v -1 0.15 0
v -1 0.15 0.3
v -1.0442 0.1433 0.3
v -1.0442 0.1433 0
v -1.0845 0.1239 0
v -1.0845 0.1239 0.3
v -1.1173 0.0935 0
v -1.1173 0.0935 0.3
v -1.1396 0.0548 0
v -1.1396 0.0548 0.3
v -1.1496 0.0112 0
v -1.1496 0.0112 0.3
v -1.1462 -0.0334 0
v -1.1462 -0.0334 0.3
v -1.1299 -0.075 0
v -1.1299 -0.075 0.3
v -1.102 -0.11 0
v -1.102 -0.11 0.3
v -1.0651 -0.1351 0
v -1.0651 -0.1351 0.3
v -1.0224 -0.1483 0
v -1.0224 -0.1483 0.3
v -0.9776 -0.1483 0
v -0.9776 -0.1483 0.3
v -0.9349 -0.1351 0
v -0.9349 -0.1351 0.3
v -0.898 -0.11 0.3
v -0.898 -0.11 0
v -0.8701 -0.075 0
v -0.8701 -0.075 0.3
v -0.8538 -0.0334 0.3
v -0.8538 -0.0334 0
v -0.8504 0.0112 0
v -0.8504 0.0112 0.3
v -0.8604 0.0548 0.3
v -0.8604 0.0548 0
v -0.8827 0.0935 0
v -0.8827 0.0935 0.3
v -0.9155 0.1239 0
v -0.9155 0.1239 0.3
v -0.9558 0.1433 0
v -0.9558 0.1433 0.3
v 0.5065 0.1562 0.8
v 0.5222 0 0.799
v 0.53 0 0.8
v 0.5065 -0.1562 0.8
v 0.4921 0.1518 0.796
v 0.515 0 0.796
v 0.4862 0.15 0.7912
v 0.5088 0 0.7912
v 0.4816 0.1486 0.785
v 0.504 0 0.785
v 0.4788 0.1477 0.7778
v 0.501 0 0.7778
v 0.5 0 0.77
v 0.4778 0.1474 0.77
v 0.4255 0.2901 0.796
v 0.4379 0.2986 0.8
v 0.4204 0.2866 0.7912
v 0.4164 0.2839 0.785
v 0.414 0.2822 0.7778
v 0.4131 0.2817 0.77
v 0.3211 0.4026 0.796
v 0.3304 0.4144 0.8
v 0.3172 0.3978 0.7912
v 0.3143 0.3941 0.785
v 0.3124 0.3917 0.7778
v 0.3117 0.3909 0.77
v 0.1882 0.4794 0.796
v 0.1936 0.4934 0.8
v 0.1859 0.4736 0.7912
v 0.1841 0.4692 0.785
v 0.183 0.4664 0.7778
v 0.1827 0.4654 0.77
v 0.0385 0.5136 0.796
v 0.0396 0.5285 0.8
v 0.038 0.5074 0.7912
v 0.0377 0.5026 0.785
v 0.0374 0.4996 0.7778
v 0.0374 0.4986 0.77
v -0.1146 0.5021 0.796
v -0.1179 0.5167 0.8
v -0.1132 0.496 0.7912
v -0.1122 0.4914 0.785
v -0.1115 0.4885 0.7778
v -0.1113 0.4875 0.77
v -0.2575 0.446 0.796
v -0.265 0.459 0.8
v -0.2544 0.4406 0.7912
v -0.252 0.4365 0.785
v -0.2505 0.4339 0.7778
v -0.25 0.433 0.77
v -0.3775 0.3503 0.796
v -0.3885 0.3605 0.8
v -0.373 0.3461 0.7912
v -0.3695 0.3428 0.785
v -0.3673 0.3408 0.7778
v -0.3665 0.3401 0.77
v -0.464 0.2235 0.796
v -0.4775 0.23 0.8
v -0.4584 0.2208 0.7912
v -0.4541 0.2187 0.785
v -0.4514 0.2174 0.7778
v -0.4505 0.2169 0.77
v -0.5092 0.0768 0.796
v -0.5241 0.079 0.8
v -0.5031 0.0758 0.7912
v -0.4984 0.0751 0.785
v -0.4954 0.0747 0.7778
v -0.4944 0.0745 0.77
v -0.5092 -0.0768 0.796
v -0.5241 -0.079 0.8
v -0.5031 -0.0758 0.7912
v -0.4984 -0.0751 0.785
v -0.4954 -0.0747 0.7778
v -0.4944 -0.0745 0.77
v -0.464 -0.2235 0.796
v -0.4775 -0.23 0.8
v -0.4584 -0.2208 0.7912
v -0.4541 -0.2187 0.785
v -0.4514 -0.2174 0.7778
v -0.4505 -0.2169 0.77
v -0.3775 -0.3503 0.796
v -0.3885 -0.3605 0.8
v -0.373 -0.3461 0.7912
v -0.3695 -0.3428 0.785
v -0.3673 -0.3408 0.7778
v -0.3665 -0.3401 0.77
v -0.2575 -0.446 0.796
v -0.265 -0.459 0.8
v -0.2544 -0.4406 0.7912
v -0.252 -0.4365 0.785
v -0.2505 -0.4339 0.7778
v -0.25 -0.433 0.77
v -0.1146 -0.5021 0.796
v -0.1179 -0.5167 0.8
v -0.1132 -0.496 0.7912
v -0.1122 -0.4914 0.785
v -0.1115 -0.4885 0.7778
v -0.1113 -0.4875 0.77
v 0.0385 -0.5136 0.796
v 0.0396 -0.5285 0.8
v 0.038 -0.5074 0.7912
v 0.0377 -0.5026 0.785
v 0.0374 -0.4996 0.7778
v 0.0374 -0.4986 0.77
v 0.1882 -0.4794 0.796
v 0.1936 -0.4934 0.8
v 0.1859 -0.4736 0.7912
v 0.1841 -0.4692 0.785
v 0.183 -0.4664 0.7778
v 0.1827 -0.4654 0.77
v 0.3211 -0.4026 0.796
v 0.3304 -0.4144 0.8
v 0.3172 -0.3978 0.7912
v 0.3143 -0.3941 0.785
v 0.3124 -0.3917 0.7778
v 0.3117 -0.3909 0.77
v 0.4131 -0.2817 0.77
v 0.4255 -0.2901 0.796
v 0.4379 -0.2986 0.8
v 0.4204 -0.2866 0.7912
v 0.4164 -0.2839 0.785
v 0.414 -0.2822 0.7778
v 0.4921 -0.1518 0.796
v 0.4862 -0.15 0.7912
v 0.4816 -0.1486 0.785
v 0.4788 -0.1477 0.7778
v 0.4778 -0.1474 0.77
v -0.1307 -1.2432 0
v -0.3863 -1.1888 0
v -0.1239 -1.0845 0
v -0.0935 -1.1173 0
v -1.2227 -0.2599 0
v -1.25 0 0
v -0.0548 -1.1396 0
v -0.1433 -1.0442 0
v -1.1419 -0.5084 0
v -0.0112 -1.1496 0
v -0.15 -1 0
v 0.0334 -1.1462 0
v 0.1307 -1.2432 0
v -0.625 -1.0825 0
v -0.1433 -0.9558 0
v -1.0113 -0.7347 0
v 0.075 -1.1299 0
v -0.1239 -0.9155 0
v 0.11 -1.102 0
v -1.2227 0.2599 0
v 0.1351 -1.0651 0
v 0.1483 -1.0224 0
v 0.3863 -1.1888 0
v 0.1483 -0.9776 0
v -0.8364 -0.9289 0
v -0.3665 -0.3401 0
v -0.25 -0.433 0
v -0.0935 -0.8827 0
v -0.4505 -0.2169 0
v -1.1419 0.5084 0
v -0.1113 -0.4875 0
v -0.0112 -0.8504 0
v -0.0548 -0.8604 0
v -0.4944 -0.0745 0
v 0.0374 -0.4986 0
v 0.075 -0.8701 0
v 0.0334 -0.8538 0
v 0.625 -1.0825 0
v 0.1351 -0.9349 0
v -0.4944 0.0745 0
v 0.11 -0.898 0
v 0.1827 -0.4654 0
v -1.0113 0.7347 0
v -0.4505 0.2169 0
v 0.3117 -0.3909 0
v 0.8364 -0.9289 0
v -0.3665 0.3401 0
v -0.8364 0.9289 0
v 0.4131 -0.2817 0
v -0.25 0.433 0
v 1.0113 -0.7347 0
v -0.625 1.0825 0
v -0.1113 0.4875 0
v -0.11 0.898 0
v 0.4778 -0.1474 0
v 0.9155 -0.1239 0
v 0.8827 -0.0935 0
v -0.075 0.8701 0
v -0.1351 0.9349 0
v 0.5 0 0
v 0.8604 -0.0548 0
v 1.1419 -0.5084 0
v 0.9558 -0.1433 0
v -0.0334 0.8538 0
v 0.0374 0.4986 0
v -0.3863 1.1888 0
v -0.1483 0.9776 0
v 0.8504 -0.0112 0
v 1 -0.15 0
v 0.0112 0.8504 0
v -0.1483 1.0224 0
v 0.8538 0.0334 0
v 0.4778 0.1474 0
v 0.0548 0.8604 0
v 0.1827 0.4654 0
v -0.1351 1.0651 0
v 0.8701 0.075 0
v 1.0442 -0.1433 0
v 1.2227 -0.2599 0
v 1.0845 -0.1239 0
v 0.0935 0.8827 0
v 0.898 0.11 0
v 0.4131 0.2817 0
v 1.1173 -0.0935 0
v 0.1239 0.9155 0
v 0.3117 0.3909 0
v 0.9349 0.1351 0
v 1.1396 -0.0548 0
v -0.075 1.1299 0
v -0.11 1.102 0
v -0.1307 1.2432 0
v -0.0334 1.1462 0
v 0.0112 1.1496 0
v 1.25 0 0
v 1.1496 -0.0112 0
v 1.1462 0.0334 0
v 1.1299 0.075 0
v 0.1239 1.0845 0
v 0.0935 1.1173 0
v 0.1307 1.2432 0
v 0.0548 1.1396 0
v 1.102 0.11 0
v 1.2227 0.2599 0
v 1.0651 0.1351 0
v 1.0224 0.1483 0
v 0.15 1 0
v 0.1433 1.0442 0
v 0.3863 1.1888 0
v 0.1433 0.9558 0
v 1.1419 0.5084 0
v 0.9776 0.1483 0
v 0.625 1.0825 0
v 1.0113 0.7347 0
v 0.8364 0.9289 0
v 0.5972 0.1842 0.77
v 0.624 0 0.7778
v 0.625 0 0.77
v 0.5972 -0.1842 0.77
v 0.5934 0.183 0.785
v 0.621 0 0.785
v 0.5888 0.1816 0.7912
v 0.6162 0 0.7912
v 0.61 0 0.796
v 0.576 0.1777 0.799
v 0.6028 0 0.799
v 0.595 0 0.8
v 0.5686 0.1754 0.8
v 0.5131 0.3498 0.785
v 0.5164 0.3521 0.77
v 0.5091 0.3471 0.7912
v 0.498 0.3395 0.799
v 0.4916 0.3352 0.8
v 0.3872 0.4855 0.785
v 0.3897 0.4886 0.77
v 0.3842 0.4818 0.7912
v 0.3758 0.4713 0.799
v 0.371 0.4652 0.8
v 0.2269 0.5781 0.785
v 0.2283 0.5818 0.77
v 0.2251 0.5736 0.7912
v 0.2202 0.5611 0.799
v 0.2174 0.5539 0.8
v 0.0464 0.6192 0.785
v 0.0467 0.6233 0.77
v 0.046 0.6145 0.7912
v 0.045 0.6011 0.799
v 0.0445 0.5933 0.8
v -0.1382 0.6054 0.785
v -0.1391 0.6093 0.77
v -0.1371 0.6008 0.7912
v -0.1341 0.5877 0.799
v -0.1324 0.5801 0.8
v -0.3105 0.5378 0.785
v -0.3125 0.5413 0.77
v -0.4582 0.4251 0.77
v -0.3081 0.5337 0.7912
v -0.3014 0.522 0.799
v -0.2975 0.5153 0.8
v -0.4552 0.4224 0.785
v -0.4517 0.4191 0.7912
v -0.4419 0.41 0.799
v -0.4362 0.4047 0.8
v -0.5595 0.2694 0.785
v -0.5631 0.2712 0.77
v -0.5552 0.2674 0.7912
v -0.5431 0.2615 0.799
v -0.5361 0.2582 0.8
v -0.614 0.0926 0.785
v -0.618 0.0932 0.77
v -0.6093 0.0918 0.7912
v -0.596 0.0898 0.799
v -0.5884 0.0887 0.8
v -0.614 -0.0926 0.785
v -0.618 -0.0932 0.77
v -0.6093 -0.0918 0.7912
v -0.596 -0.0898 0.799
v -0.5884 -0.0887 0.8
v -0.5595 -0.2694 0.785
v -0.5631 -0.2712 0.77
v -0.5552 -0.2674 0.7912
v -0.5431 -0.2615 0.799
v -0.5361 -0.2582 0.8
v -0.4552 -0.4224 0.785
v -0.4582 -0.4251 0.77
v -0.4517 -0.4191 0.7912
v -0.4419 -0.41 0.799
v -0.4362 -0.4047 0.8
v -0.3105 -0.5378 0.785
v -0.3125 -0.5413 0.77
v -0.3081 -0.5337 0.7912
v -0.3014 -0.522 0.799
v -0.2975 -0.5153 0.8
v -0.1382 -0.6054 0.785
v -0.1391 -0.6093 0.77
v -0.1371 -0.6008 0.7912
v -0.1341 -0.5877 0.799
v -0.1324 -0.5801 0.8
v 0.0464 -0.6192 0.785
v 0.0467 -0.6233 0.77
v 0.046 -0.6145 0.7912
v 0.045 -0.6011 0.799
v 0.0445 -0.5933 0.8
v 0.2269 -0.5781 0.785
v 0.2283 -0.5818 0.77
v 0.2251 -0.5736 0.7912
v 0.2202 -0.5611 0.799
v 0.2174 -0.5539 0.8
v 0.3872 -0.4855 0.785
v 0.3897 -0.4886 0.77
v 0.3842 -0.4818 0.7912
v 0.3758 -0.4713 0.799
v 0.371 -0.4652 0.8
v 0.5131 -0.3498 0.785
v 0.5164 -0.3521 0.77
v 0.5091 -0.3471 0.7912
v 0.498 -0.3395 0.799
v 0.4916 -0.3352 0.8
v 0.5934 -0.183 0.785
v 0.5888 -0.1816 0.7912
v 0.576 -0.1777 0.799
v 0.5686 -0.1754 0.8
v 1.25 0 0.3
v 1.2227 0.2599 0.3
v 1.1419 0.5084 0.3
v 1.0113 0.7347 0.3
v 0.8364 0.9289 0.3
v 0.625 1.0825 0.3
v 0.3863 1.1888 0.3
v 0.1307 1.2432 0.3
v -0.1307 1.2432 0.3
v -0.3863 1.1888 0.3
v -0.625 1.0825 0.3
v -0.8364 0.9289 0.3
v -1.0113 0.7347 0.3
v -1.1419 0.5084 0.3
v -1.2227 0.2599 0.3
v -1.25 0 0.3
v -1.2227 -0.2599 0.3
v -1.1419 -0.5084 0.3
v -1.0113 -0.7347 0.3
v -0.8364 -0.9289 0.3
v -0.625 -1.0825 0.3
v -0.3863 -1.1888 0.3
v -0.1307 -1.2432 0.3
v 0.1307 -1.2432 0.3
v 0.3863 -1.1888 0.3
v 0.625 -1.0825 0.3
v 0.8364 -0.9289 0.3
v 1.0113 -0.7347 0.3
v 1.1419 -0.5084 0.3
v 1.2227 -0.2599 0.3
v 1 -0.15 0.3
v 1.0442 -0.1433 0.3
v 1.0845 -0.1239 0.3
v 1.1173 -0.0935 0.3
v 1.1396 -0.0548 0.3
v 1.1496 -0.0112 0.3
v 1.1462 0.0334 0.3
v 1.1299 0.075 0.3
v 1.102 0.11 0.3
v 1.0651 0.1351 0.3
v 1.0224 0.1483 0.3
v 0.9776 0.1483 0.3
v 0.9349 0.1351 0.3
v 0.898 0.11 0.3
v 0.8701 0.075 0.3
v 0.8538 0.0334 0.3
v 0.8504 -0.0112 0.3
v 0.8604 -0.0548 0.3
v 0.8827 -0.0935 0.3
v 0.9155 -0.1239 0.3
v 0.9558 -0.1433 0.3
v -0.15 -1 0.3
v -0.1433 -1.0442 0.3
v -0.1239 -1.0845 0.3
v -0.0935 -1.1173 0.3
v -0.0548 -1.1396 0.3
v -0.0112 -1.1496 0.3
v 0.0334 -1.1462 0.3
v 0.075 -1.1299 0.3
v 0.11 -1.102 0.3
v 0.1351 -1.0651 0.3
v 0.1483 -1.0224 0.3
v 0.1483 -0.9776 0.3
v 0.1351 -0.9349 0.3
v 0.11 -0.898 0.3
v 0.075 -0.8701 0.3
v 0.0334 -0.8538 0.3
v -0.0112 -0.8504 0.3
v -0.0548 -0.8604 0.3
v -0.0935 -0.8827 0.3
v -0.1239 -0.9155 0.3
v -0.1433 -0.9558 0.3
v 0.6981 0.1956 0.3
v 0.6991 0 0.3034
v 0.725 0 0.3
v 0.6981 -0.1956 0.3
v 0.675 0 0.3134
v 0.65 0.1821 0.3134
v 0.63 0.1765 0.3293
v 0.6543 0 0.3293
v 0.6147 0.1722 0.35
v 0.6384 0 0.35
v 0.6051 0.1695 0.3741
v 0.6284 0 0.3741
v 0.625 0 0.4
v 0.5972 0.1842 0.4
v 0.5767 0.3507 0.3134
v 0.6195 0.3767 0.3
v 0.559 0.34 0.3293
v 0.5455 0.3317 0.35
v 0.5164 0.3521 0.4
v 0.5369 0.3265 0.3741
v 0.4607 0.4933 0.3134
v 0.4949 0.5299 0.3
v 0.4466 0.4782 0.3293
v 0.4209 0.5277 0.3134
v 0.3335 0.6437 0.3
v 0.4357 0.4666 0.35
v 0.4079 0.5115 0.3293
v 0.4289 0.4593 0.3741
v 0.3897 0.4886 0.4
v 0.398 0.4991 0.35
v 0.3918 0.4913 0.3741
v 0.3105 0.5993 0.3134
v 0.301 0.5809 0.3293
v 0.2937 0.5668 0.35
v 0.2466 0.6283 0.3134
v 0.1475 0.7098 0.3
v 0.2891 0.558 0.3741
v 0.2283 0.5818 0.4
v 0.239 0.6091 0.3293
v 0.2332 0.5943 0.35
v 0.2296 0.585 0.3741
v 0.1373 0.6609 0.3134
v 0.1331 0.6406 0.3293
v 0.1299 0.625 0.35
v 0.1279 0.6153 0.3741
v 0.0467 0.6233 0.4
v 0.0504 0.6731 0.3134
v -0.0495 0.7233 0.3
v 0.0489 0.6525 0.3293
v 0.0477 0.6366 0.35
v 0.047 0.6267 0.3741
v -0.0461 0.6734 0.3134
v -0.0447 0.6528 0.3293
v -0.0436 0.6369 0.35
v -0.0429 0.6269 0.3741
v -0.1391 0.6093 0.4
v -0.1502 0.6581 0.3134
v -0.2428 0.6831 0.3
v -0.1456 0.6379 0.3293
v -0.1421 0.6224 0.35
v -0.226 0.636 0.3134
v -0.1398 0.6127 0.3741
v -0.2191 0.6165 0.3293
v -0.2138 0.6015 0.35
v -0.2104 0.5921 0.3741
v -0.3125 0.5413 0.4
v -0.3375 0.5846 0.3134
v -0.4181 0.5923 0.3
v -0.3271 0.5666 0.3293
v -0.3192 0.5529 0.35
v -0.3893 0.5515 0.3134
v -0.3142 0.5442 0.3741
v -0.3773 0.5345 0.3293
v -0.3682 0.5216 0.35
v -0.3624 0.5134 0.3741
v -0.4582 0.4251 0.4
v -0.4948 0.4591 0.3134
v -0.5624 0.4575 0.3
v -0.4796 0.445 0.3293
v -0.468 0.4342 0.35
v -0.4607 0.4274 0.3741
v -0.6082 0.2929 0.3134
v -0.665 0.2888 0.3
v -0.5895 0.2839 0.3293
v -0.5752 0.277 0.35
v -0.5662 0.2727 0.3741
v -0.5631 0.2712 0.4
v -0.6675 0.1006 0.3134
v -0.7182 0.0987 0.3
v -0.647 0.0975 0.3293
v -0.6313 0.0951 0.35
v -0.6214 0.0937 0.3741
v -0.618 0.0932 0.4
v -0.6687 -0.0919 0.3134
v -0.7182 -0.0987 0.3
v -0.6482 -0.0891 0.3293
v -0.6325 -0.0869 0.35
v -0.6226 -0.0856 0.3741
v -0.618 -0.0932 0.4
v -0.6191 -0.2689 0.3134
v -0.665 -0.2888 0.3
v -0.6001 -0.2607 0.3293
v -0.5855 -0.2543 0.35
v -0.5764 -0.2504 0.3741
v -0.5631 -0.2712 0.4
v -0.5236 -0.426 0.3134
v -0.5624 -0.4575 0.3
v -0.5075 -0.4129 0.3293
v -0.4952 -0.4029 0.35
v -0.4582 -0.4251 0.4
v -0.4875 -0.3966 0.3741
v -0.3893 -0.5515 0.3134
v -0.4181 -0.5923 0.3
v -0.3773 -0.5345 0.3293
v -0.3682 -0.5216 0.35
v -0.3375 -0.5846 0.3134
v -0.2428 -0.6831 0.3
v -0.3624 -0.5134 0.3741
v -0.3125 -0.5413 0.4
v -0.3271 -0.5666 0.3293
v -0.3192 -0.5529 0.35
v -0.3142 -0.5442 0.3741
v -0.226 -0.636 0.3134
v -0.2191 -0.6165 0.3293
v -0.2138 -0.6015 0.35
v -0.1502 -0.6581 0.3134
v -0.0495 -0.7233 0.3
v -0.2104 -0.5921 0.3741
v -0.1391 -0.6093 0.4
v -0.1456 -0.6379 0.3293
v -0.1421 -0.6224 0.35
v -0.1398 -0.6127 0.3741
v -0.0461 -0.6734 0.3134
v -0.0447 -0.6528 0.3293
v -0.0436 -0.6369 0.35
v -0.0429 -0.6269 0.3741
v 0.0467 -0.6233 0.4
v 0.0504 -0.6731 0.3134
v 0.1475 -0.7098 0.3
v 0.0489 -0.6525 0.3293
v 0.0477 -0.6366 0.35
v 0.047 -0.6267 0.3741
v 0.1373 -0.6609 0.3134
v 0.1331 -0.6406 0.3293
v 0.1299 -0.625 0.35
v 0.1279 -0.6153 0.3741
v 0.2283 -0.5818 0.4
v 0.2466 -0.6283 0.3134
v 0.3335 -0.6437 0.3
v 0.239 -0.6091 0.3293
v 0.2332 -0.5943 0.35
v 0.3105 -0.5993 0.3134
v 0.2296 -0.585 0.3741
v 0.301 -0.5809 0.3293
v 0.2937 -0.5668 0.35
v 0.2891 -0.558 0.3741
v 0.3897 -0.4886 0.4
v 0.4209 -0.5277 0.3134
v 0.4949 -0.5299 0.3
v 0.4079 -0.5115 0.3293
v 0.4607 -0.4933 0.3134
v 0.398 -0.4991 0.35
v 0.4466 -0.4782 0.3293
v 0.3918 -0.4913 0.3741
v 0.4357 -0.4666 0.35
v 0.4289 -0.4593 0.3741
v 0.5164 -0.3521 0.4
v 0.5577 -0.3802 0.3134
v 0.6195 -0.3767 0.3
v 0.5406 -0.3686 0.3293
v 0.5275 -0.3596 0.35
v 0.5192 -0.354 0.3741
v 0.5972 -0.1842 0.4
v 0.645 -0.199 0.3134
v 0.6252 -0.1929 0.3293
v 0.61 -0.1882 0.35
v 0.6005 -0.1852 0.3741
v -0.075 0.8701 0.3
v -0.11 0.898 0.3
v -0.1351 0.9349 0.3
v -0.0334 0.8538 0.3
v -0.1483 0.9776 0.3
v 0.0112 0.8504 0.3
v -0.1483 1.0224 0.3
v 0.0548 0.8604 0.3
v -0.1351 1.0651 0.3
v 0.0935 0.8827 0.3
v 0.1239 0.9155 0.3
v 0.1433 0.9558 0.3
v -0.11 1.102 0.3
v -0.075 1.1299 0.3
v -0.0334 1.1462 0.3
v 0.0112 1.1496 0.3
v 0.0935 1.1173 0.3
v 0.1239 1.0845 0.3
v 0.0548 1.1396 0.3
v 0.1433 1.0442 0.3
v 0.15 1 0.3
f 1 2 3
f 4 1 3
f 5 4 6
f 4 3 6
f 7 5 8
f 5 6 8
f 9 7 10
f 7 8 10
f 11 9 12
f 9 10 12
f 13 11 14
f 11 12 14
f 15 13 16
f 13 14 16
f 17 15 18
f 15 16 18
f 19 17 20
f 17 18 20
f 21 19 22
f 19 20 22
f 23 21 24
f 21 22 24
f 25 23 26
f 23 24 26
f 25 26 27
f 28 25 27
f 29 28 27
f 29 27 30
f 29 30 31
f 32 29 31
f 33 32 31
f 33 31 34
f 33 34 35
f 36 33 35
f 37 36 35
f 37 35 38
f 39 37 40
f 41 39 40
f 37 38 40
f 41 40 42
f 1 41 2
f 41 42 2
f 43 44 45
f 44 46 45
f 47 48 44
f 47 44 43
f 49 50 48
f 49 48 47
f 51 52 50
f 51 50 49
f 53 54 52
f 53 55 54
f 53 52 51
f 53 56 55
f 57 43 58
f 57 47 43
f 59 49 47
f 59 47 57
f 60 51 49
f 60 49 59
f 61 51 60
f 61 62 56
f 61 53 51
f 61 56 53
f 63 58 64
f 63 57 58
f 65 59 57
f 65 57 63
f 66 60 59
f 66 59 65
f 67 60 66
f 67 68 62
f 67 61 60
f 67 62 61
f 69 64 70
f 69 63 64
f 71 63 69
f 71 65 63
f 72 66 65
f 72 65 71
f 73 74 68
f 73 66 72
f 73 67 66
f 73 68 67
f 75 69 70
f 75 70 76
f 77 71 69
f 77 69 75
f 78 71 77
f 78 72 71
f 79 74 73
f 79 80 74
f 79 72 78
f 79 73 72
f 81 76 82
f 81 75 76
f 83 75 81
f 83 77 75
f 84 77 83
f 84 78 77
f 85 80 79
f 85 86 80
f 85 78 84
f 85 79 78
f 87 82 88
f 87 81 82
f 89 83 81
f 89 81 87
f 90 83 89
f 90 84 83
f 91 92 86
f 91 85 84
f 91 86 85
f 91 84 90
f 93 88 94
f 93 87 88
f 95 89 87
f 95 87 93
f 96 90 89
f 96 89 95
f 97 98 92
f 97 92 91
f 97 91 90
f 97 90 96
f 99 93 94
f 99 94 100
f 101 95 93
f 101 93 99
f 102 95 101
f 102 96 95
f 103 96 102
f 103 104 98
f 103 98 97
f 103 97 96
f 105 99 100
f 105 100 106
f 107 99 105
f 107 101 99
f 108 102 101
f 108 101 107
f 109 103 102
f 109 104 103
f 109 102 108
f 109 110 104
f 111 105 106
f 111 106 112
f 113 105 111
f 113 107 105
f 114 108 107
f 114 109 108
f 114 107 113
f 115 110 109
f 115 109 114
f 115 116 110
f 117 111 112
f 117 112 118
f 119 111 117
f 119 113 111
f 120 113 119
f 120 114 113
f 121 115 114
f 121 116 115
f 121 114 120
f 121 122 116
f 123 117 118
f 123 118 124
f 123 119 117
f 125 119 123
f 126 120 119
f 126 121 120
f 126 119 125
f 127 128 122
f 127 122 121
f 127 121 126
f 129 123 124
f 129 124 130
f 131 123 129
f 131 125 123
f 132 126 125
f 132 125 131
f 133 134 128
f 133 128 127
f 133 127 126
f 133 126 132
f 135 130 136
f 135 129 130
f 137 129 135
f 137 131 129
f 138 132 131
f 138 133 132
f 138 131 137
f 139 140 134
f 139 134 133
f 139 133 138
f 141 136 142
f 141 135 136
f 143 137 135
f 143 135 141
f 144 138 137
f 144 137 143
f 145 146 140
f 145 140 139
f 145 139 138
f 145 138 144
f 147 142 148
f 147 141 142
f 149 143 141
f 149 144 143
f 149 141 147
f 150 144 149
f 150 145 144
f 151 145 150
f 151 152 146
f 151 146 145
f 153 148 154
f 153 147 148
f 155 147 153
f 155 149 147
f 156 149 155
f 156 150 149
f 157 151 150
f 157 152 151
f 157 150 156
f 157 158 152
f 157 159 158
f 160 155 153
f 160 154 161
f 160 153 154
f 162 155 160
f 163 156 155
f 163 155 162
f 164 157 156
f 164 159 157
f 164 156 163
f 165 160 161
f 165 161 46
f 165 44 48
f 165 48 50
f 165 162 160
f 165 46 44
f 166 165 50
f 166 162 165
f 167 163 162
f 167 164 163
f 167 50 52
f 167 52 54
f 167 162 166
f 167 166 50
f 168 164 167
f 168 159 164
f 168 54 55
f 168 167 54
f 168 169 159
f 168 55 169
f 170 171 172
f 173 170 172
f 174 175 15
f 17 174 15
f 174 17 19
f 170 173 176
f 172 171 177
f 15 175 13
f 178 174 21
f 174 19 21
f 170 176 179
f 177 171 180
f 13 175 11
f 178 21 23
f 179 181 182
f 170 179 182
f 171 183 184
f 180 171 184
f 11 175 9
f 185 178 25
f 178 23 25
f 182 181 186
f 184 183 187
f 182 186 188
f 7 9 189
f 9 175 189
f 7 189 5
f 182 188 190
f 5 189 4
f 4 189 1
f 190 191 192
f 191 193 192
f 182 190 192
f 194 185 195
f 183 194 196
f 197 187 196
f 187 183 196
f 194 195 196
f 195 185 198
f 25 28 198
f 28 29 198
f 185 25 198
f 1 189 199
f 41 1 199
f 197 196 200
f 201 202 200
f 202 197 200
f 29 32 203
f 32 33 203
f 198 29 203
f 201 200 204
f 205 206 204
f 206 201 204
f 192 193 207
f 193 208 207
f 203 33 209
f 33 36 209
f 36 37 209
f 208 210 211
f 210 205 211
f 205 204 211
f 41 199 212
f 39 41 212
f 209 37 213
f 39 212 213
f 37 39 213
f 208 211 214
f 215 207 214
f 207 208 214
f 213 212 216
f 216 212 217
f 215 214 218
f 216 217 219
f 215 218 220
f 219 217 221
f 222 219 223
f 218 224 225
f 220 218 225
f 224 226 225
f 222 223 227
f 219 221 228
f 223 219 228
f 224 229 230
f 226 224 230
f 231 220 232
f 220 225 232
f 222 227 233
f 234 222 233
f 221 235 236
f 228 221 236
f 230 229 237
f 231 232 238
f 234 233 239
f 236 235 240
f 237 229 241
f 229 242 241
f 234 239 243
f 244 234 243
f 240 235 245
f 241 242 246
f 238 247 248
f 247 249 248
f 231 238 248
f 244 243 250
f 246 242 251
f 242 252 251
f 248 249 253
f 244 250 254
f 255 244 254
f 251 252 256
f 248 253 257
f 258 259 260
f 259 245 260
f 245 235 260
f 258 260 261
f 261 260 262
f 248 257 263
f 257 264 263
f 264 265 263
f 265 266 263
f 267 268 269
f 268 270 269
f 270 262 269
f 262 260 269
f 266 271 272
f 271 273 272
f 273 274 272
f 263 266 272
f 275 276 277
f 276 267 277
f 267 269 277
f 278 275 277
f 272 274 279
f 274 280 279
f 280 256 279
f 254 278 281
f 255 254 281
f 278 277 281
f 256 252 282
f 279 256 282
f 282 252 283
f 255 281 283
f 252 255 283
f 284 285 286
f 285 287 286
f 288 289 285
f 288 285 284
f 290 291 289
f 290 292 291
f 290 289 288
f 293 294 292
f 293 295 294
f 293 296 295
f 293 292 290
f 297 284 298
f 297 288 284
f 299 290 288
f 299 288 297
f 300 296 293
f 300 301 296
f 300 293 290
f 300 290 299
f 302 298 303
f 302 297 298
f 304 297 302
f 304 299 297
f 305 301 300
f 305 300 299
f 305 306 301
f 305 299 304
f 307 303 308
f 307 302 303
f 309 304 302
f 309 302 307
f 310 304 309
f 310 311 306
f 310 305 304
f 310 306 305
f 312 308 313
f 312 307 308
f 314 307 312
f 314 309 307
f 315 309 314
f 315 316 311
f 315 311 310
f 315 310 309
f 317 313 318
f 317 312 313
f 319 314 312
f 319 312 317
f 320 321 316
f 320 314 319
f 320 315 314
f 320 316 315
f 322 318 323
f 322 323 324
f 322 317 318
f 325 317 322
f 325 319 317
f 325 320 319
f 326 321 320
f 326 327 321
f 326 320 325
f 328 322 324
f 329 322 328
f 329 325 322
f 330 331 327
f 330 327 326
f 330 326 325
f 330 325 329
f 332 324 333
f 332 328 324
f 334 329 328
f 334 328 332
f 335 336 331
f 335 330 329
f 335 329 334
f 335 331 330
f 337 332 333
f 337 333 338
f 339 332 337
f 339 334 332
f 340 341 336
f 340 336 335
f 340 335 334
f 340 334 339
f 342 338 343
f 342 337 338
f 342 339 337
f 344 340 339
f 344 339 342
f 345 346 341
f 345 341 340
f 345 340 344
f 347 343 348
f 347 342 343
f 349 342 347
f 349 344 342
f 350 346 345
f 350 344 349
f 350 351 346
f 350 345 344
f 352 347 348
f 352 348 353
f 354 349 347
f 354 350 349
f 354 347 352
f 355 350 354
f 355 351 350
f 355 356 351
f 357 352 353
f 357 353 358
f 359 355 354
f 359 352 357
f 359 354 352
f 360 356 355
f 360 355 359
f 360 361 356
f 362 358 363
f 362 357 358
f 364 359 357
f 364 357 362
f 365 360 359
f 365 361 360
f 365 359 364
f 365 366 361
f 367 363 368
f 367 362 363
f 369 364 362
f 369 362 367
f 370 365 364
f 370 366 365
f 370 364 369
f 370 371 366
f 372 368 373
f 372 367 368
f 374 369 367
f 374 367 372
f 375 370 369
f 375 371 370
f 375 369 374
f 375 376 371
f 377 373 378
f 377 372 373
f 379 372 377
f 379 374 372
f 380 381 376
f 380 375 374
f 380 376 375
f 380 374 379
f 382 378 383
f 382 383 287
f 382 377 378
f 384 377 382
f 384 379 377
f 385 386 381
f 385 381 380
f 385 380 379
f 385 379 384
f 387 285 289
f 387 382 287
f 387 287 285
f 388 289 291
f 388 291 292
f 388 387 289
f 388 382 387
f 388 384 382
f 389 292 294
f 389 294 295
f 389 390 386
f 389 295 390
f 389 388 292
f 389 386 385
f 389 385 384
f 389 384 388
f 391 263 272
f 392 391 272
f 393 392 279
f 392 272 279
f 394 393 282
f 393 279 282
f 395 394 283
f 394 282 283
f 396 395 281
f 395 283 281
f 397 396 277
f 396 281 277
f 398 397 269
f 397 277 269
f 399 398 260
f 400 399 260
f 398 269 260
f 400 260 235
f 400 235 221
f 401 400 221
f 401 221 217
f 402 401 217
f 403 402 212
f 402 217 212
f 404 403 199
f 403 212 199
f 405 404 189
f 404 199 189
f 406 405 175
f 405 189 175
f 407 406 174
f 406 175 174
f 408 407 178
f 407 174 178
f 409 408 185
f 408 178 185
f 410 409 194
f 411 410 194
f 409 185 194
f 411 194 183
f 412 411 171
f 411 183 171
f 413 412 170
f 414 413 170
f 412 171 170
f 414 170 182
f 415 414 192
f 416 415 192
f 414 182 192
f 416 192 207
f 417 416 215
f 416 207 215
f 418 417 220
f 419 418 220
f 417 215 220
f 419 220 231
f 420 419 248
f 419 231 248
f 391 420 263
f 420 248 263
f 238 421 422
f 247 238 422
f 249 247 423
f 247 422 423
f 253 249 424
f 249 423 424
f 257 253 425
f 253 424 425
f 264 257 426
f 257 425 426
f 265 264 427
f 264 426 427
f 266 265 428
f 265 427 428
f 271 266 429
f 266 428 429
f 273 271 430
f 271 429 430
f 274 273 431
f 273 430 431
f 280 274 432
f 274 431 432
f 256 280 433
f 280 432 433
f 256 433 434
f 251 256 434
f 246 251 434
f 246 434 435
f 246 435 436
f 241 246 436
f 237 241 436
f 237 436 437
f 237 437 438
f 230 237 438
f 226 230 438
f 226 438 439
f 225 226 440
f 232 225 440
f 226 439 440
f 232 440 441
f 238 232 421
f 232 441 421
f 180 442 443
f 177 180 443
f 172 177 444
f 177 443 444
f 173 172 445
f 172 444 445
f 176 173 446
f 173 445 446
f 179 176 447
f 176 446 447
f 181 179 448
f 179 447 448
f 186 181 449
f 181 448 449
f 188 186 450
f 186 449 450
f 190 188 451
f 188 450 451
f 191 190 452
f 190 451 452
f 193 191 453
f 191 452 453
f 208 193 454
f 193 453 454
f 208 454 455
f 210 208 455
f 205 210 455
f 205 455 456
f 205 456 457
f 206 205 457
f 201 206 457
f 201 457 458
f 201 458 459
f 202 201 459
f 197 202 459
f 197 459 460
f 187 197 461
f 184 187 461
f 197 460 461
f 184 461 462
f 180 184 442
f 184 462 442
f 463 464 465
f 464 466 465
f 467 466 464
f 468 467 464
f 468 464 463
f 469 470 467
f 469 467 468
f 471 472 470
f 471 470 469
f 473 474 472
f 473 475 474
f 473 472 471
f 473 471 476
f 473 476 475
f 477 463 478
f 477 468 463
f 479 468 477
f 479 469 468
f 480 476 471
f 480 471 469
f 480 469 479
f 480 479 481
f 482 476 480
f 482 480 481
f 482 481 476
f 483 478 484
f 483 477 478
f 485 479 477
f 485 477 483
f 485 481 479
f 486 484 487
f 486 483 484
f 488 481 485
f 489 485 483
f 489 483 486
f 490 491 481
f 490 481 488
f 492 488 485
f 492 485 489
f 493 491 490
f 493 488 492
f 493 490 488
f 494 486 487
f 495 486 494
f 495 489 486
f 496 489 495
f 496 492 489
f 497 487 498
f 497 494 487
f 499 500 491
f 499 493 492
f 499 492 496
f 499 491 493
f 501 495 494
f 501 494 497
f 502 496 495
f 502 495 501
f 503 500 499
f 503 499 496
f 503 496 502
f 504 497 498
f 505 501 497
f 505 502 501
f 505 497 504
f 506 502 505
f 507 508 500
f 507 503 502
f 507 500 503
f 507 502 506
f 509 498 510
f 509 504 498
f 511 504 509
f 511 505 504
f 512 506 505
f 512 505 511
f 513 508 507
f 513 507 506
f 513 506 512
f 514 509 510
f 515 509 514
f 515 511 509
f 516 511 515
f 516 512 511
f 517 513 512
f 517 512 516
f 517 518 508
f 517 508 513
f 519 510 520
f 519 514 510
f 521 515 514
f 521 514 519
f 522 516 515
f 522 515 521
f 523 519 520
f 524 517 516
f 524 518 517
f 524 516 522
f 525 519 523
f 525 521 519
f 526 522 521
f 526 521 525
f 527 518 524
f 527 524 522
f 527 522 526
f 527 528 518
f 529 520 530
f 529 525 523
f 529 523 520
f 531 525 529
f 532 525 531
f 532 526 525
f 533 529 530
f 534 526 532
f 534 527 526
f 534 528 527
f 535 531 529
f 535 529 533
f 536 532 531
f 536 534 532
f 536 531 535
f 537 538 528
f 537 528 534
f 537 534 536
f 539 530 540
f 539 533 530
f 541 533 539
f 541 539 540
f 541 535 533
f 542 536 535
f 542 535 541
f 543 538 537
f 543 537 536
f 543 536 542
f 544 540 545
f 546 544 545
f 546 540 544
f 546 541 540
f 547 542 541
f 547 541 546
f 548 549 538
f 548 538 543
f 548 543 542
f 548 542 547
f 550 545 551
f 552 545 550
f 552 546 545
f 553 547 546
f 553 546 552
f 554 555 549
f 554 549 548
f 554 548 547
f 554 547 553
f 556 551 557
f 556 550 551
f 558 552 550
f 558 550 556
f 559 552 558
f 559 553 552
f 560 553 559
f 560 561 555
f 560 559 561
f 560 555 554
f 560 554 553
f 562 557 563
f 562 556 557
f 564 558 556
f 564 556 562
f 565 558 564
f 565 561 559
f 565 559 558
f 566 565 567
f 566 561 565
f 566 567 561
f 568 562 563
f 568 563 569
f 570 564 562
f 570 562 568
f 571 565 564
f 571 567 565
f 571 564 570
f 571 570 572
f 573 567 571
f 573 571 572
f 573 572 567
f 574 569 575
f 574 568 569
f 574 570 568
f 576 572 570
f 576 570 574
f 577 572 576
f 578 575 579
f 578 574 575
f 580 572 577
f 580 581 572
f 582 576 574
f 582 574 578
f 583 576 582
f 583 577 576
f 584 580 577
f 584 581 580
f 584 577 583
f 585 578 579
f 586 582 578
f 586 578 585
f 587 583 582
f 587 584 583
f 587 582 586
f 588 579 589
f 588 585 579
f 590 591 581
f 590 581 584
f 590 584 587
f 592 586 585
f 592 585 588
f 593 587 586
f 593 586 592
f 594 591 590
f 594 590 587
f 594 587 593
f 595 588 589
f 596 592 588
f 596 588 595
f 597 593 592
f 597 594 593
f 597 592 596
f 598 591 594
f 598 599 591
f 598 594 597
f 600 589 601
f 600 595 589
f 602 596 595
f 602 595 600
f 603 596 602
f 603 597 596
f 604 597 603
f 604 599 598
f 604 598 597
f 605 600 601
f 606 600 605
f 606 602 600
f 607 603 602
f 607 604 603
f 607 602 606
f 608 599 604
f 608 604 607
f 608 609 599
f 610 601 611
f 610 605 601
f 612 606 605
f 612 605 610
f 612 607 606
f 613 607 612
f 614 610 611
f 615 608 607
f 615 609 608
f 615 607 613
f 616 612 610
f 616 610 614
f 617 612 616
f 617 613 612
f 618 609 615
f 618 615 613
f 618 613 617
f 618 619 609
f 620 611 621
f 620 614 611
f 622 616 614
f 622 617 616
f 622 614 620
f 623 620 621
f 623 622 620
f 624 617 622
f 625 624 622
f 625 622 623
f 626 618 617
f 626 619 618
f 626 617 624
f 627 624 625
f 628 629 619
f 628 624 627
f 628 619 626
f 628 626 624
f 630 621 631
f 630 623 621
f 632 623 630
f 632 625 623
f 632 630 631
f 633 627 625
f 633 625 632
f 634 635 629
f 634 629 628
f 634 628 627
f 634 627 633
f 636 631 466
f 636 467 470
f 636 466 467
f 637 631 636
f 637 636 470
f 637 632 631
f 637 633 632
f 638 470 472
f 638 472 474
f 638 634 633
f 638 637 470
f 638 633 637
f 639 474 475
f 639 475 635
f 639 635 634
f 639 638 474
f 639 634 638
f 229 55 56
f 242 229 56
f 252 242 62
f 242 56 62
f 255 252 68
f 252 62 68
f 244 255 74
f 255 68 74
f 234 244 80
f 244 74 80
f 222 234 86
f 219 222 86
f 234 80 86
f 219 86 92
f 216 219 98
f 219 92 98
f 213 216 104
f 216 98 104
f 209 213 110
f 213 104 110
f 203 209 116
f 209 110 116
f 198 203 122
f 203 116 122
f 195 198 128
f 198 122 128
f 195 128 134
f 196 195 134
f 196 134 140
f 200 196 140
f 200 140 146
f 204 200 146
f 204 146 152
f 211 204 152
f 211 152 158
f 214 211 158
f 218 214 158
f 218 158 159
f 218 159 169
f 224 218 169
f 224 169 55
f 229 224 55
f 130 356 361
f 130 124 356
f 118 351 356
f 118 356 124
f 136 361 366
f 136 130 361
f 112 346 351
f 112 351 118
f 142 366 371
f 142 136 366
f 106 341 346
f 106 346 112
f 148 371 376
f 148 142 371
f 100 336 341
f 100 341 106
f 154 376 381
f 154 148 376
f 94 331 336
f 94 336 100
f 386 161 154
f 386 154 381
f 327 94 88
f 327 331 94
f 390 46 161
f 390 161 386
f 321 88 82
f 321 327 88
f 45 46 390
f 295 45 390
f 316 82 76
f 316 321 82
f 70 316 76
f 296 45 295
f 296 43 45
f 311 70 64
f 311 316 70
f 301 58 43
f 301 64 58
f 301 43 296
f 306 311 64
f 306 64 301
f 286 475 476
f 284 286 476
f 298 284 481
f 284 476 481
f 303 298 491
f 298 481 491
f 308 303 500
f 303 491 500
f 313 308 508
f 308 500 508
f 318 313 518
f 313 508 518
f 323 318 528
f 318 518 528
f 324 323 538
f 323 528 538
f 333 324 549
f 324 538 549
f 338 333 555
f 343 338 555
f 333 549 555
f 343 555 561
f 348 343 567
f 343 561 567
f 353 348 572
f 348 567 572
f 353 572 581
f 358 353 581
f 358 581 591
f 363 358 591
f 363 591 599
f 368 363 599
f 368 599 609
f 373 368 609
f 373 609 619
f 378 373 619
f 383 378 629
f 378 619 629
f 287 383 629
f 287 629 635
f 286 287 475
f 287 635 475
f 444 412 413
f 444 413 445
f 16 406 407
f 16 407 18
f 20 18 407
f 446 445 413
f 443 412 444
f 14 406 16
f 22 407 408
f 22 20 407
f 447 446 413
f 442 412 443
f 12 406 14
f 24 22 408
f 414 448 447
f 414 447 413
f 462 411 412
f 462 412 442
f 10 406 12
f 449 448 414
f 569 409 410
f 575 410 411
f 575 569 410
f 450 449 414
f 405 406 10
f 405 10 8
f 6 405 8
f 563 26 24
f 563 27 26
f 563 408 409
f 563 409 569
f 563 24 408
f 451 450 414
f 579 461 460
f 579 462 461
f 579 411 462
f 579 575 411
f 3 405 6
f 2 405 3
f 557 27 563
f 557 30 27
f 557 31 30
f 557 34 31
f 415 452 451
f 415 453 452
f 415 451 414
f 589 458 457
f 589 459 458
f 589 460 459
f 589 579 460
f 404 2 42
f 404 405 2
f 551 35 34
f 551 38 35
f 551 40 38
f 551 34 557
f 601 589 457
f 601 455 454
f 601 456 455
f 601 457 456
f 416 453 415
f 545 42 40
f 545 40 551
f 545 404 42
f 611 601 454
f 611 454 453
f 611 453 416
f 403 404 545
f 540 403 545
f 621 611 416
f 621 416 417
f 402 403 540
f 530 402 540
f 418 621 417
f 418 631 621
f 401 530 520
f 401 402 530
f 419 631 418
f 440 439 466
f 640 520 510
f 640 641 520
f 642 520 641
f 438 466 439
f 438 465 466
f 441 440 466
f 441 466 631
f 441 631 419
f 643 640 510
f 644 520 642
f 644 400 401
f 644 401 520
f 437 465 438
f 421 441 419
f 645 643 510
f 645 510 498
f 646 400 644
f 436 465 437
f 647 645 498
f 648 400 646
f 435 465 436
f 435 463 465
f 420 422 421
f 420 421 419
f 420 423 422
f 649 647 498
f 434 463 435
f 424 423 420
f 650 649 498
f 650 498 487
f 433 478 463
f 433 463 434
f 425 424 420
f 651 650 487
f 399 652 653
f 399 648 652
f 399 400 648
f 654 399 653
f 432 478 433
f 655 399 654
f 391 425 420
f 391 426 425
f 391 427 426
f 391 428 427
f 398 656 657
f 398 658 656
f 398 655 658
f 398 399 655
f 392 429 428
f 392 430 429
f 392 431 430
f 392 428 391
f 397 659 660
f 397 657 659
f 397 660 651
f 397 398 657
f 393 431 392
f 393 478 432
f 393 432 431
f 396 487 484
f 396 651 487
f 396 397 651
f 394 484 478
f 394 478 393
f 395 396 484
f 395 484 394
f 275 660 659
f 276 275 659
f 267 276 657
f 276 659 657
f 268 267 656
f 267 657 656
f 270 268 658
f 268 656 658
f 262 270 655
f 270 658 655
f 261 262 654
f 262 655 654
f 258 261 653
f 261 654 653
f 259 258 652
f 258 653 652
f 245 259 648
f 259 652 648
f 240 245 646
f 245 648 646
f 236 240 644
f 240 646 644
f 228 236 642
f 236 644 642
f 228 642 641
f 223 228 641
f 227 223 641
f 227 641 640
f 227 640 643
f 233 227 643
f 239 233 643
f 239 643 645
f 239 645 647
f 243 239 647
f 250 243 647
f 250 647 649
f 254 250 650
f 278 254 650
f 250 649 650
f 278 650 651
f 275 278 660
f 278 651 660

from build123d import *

# Parameters (mm, degrees)
SKETCH1_R           = 1.25
BOSS_EXTRUDE1_DEPTH = 0.3
SKETCH2_R           = 0.15
CUT_EXTRUDE1_DEPTH  = 0.3
CIRPATTERN2_COUNT   = 4
SKETCH3_R           = 0.625
BOSS_EXTRUDE2_DEPTH = 0.5
SKETCH4_R           = 0.5
CUT_EXTRUDE3_DEPTH  = 10.5
FILLET2_R           = 0.1
FILLET6_R           = 0.03


with BuildPart() as part:
    # Sketch1 → Boss-Extrude1 (new body)
    with BuildSketch(Plane.XY):
        Circle(SKETCH1_R)
    extrude(amount=BOSS_EXTRUDE1_DEPTH)

    # Sketch2 → Cut-Extrude1 (cut)
    with BuildSketch(Plane.XY.offset(0.3)):
        with Locations((0, 1)):
            Circle(SKETCH2_R)
    cut_extrude1 = extrude(amount=-CUT_EXTRUDE1_DEPTH, mode=Mode.SUBTRACT)

    # CirPattern2: Cut-Extrude1 ×4 about axis
    cirpattern2_axis = Axis((0, 0, 0), (0, 0, 1))
    for i in range(1, CIRPATTERN2_COUNT):
        add(cut_extrude1.rotate(cirpattern2_axis, i * 360 / CIRPATTERN2_COUNT), mode=Mode.SUBTRACT)

    # Sketch3 → Boss-Extrude2 (add)
    with BuildSketch(Plane.XY.offset(0.3)):
        Circle(SKETCH3_R)
    extrude(amount=BOSS_EXTRUDE2_DEPTH)

    # Sketch4 → Cut-Extrude3 (cut)
    with BuildSketch(Plane.XY.offset(0.8)):
        Circle(SKETCH4_R)
    extrude(amount=-CUT_EXTRUDE3_DEPTH, mode=Mode.SUBTRACT)

    # Fillet2
    fillet2_edges = [part.edges().sort_by_distance(p)[0] for p in [
        (-0.625, 0, 0.3),
    ]]
    fillet(fillet2_edges, radius=FILLET2_R)

    # Fillet6
    fillet6_edges = [part.edges().sort_by_distance(p)[0] for p in [
        (-0.625, 0, 0.8),
        (-0.5, 0, 0.8),
    ]]
    fillet(fillet6_edges, radius=FILLET6_R)


solid = part.part
